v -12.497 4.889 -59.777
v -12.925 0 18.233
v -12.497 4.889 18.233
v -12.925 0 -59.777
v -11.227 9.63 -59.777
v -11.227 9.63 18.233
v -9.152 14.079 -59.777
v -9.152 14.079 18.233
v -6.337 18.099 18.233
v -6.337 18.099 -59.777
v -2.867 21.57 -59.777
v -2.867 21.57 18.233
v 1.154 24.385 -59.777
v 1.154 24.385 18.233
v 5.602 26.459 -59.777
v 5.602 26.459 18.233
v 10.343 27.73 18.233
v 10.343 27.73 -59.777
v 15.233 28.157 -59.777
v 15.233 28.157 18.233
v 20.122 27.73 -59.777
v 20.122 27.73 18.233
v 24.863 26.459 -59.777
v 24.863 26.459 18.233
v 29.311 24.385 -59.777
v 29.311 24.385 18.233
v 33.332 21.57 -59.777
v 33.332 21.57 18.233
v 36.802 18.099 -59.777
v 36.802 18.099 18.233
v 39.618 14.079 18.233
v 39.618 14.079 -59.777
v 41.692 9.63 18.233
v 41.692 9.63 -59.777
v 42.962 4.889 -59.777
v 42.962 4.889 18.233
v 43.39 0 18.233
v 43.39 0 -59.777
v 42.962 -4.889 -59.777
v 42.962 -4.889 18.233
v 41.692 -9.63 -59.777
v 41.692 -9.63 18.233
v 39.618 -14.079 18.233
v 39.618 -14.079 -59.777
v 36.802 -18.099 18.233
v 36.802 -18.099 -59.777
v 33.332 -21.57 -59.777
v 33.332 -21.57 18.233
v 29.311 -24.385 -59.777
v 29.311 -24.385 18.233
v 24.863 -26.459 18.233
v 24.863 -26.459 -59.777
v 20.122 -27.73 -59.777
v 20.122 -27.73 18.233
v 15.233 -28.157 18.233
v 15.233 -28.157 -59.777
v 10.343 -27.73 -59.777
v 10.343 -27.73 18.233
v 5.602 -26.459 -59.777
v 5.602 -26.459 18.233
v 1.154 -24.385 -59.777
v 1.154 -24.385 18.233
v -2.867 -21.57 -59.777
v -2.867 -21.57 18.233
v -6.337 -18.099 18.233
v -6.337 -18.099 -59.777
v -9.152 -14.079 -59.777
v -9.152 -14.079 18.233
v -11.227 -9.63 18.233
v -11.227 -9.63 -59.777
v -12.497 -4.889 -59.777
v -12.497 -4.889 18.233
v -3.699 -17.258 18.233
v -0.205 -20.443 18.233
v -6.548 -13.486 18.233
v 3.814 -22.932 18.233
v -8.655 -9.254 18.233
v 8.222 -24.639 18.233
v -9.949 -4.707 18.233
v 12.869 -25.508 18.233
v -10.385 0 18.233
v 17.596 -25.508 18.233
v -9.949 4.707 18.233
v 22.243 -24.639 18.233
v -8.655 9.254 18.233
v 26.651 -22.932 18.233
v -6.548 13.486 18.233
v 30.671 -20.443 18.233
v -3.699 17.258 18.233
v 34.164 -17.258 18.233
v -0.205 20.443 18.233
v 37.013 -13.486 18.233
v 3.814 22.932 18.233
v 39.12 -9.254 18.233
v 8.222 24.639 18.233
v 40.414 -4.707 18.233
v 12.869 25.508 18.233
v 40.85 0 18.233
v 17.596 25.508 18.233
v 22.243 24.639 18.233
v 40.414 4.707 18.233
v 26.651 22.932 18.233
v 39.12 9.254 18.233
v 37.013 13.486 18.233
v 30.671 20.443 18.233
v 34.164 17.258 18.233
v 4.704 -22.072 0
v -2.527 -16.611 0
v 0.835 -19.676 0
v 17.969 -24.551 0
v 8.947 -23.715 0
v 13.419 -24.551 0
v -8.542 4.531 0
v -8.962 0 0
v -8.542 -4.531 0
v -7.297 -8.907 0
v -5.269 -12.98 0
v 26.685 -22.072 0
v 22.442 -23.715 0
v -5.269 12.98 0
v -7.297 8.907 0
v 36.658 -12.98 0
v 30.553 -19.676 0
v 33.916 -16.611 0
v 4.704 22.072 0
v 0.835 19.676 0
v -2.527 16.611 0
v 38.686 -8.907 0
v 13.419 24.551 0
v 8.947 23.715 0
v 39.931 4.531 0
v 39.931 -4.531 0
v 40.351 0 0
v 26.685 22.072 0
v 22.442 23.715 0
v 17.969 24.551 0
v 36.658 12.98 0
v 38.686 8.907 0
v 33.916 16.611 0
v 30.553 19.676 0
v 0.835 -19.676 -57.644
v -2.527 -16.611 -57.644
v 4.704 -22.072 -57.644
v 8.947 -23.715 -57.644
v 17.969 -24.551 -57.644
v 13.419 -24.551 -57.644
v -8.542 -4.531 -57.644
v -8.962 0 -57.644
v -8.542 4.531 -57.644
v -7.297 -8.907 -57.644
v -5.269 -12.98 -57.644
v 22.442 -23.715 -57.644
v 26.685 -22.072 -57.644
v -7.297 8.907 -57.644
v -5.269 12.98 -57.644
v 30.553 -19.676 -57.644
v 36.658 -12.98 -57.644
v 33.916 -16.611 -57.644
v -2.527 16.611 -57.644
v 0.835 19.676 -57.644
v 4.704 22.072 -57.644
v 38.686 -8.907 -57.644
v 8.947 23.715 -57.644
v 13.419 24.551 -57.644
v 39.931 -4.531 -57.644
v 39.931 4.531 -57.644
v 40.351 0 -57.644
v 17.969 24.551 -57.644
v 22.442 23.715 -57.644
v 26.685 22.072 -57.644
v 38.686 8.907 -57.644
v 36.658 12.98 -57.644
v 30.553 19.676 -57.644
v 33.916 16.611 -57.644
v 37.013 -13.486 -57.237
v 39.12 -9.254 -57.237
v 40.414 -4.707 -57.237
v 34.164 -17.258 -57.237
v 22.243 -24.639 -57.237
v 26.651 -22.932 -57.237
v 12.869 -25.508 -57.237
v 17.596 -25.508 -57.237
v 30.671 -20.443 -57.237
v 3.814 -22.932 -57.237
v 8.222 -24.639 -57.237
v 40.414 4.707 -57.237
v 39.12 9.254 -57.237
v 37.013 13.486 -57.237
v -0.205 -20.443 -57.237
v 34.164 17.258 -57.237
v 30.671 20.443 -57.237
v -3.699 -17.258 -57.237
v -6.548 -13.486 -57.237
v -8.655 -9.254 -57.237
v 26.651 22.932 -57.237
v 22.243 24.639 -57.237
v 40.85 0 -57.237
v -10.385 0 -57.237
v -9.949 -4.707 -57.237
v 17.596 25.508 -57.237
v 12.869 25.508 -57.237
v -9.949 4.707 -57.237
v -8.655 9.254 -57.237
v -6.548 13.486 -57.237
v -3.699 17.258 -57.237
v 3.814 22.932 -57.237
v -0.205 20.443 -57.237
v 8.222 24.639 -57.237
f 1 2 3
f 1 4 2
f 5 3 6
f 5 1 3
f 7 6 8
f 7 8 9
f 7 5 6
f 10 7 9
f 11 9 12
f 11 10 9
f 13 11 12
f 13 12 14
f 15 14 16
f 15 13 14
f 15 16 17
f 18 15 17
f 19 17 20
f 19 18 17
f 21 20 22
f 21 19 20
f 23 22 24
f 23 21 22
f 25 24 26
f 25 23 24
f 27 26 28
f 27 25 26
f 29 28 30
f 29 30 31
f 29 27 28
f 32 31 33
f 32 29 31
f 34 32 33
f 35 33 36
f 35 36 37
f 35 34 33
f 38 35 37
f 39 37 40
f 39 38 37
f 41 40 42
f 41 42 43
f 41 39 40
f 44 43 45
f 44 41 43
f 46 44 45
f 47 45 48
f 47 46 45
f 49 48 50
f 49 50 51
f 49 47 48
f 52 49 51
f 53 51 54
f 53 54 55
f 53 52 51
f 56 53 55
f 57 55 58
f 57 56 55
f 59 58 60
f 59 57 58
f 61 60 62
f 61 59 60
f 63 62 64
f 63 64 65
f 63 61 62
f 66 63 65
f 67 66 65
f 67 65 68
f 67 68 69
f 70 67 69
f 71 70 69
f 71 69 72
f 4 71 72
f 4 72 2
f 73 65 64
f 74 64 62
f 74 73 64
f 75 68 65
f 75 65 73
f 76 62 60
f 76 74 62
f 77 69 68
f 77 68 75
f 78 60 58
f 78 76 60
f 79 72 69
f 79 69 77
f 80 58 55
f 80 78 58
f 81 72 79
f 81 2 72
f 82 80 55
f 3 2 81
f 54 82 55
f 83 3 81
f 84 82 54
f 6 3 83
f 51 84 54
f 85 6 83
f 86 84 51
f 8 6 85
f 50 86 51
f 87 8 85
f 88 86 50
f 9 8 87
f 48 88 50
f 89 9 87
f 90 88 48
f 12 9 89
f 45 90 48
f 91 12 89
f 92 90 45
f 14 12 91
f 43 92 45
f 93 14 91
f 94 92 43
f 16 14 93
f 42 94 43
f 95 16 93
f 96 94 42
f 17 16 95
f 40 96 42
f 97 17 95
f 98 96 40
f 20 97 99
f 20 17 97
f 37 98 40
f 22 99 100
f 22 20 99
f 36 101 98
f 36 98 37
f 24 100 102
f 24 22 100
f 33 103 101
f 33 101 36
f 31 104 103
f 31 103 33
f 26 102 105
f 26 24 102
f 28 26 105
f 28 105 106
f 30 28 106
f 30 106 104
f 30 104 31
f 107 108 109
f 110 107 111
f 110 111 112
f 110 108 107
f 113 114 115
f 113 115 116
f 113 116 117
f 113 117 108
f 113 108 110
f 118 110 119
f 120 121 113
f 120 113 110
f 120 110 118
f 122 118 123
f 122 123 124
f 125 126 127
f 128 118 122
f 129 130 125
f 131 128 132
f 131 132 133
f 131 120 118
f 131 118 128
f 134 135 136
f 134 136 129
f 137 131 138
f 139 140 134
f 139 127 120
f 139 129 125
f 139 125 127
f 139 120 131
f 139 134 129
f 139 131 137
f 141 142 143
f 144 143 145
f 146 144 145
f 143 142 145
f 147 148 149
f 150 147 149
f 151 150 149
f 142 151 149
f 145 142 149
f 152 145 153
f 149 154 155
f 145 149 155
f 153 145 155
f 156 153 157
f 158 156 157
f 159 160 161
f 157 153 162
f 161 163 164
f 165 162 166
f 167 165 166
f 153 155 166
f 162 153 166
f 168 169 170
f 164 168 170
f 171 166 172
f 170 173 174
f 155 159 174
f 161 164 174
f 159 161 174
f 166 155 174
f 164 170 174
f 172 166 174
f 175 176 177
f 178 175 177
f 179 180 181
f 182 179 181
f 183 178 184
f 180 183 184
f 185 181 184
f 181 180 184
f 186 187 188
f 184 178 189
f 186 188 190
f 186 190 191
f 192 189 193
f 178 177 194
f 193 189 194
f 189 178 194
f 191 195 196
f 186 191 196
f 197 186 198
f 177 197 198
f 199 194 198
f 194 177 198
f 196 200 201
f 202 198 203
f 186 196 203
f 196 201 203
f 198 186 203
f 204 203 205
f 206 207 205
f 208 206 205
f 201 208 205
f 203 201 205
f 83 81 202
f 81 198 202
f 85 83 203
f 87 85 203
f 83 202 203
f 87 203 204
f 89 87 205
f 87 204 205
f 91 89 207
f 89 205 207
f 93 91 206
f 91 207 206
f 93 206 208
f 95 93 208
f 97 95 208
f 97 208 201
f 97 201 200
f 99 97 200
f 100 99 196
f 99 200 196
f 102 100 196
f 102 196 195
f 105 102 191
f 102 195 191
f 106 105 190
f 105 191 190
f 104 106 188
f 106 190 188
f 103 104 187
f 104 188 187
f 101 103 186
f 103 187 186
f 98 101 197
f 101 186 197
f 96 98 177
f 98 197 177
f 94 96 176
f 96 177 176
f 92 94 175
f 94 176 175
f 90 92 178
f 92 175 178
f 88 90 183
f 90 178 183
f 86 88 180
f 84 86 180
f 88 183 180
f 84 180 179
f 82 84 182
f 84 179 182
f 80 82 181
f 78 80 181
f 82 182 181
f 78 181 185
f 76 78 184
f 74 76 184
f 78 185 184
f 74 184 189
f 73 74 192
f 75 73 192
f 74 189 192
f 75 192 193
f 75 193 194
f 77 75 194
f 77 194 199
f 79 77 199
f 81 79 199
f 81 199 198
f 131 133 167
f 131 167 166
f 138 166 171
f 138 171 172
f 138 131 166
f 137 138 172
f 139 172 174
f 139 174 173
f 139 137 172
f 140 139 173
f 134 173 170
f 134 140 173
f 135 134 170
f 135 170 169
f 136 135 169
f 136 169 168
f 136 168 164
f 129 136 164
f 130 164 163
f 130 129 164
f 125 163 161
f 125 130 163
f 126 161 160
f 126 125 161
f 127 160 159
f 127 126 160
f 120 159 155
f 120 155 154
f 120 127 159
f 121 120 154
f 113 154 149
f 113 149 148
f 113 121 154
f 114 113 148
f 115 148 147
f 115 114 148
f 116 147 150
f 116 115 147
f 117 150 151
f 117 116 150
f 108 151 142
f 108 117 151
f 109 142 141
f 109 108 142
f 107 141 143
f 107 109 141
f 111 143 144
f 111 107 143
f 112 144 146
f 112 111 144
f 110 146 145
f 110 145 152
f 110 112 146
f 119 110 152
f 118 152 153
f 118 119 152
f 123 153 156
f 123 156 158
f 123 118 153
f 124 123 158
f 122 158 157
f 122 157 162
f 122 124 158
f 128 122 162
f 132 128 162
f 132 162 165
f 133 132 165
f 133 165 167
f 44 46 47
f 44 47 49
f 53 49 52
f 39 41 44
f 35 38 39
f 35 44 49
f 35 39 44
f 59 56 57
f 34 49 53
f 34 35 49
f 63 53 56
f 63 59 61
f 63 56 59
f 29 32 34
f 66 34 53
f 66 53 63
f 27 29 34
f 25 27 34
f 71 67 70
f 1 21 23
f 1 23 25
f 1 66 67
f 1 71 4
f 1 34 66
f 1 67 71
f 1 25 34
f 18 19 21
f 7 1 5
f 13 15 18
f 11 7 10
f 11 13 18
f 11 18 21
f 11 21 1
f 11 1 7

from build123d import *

# Parameters (mm, degrees)
F2_T     = -2.54
F3_R     = 24.656533
F4_DEPTH = 57.64441


with BuildPart() as f1:
    # F0 (on Front) → F1 (revolve)
    with BuildSketch(Plane.XZ):
        Polygon((15.232669, 18.233048), (-12.924691, 18.233048), (-12.924691, -7.154734), (-12.924691, -33.004116), (-12.924691, -59.776686), (15.232669, -59.776686), align=None)
    revolve(axis=Axis((15.232669, 0, -20.771819), (0, 0, -1)))

    # F2
    f2_openings = [f1.faces().sort_by_distance(p)[0] for p in [
        (15.232669, 0, 18.233048),
    ]]
    offset(amount=F2_T, openings=f2_openings)


with BuildPart() as f4:
    # F3 (on Top) → F4 (new body)
    with BuildSketch(Plane.XY):
        with Locations((15.694266, 0)):
            Circle(F3_R)
    extrude(amount=-F4_DEPTH)


solid = Compound([f1.part, f4.part])
